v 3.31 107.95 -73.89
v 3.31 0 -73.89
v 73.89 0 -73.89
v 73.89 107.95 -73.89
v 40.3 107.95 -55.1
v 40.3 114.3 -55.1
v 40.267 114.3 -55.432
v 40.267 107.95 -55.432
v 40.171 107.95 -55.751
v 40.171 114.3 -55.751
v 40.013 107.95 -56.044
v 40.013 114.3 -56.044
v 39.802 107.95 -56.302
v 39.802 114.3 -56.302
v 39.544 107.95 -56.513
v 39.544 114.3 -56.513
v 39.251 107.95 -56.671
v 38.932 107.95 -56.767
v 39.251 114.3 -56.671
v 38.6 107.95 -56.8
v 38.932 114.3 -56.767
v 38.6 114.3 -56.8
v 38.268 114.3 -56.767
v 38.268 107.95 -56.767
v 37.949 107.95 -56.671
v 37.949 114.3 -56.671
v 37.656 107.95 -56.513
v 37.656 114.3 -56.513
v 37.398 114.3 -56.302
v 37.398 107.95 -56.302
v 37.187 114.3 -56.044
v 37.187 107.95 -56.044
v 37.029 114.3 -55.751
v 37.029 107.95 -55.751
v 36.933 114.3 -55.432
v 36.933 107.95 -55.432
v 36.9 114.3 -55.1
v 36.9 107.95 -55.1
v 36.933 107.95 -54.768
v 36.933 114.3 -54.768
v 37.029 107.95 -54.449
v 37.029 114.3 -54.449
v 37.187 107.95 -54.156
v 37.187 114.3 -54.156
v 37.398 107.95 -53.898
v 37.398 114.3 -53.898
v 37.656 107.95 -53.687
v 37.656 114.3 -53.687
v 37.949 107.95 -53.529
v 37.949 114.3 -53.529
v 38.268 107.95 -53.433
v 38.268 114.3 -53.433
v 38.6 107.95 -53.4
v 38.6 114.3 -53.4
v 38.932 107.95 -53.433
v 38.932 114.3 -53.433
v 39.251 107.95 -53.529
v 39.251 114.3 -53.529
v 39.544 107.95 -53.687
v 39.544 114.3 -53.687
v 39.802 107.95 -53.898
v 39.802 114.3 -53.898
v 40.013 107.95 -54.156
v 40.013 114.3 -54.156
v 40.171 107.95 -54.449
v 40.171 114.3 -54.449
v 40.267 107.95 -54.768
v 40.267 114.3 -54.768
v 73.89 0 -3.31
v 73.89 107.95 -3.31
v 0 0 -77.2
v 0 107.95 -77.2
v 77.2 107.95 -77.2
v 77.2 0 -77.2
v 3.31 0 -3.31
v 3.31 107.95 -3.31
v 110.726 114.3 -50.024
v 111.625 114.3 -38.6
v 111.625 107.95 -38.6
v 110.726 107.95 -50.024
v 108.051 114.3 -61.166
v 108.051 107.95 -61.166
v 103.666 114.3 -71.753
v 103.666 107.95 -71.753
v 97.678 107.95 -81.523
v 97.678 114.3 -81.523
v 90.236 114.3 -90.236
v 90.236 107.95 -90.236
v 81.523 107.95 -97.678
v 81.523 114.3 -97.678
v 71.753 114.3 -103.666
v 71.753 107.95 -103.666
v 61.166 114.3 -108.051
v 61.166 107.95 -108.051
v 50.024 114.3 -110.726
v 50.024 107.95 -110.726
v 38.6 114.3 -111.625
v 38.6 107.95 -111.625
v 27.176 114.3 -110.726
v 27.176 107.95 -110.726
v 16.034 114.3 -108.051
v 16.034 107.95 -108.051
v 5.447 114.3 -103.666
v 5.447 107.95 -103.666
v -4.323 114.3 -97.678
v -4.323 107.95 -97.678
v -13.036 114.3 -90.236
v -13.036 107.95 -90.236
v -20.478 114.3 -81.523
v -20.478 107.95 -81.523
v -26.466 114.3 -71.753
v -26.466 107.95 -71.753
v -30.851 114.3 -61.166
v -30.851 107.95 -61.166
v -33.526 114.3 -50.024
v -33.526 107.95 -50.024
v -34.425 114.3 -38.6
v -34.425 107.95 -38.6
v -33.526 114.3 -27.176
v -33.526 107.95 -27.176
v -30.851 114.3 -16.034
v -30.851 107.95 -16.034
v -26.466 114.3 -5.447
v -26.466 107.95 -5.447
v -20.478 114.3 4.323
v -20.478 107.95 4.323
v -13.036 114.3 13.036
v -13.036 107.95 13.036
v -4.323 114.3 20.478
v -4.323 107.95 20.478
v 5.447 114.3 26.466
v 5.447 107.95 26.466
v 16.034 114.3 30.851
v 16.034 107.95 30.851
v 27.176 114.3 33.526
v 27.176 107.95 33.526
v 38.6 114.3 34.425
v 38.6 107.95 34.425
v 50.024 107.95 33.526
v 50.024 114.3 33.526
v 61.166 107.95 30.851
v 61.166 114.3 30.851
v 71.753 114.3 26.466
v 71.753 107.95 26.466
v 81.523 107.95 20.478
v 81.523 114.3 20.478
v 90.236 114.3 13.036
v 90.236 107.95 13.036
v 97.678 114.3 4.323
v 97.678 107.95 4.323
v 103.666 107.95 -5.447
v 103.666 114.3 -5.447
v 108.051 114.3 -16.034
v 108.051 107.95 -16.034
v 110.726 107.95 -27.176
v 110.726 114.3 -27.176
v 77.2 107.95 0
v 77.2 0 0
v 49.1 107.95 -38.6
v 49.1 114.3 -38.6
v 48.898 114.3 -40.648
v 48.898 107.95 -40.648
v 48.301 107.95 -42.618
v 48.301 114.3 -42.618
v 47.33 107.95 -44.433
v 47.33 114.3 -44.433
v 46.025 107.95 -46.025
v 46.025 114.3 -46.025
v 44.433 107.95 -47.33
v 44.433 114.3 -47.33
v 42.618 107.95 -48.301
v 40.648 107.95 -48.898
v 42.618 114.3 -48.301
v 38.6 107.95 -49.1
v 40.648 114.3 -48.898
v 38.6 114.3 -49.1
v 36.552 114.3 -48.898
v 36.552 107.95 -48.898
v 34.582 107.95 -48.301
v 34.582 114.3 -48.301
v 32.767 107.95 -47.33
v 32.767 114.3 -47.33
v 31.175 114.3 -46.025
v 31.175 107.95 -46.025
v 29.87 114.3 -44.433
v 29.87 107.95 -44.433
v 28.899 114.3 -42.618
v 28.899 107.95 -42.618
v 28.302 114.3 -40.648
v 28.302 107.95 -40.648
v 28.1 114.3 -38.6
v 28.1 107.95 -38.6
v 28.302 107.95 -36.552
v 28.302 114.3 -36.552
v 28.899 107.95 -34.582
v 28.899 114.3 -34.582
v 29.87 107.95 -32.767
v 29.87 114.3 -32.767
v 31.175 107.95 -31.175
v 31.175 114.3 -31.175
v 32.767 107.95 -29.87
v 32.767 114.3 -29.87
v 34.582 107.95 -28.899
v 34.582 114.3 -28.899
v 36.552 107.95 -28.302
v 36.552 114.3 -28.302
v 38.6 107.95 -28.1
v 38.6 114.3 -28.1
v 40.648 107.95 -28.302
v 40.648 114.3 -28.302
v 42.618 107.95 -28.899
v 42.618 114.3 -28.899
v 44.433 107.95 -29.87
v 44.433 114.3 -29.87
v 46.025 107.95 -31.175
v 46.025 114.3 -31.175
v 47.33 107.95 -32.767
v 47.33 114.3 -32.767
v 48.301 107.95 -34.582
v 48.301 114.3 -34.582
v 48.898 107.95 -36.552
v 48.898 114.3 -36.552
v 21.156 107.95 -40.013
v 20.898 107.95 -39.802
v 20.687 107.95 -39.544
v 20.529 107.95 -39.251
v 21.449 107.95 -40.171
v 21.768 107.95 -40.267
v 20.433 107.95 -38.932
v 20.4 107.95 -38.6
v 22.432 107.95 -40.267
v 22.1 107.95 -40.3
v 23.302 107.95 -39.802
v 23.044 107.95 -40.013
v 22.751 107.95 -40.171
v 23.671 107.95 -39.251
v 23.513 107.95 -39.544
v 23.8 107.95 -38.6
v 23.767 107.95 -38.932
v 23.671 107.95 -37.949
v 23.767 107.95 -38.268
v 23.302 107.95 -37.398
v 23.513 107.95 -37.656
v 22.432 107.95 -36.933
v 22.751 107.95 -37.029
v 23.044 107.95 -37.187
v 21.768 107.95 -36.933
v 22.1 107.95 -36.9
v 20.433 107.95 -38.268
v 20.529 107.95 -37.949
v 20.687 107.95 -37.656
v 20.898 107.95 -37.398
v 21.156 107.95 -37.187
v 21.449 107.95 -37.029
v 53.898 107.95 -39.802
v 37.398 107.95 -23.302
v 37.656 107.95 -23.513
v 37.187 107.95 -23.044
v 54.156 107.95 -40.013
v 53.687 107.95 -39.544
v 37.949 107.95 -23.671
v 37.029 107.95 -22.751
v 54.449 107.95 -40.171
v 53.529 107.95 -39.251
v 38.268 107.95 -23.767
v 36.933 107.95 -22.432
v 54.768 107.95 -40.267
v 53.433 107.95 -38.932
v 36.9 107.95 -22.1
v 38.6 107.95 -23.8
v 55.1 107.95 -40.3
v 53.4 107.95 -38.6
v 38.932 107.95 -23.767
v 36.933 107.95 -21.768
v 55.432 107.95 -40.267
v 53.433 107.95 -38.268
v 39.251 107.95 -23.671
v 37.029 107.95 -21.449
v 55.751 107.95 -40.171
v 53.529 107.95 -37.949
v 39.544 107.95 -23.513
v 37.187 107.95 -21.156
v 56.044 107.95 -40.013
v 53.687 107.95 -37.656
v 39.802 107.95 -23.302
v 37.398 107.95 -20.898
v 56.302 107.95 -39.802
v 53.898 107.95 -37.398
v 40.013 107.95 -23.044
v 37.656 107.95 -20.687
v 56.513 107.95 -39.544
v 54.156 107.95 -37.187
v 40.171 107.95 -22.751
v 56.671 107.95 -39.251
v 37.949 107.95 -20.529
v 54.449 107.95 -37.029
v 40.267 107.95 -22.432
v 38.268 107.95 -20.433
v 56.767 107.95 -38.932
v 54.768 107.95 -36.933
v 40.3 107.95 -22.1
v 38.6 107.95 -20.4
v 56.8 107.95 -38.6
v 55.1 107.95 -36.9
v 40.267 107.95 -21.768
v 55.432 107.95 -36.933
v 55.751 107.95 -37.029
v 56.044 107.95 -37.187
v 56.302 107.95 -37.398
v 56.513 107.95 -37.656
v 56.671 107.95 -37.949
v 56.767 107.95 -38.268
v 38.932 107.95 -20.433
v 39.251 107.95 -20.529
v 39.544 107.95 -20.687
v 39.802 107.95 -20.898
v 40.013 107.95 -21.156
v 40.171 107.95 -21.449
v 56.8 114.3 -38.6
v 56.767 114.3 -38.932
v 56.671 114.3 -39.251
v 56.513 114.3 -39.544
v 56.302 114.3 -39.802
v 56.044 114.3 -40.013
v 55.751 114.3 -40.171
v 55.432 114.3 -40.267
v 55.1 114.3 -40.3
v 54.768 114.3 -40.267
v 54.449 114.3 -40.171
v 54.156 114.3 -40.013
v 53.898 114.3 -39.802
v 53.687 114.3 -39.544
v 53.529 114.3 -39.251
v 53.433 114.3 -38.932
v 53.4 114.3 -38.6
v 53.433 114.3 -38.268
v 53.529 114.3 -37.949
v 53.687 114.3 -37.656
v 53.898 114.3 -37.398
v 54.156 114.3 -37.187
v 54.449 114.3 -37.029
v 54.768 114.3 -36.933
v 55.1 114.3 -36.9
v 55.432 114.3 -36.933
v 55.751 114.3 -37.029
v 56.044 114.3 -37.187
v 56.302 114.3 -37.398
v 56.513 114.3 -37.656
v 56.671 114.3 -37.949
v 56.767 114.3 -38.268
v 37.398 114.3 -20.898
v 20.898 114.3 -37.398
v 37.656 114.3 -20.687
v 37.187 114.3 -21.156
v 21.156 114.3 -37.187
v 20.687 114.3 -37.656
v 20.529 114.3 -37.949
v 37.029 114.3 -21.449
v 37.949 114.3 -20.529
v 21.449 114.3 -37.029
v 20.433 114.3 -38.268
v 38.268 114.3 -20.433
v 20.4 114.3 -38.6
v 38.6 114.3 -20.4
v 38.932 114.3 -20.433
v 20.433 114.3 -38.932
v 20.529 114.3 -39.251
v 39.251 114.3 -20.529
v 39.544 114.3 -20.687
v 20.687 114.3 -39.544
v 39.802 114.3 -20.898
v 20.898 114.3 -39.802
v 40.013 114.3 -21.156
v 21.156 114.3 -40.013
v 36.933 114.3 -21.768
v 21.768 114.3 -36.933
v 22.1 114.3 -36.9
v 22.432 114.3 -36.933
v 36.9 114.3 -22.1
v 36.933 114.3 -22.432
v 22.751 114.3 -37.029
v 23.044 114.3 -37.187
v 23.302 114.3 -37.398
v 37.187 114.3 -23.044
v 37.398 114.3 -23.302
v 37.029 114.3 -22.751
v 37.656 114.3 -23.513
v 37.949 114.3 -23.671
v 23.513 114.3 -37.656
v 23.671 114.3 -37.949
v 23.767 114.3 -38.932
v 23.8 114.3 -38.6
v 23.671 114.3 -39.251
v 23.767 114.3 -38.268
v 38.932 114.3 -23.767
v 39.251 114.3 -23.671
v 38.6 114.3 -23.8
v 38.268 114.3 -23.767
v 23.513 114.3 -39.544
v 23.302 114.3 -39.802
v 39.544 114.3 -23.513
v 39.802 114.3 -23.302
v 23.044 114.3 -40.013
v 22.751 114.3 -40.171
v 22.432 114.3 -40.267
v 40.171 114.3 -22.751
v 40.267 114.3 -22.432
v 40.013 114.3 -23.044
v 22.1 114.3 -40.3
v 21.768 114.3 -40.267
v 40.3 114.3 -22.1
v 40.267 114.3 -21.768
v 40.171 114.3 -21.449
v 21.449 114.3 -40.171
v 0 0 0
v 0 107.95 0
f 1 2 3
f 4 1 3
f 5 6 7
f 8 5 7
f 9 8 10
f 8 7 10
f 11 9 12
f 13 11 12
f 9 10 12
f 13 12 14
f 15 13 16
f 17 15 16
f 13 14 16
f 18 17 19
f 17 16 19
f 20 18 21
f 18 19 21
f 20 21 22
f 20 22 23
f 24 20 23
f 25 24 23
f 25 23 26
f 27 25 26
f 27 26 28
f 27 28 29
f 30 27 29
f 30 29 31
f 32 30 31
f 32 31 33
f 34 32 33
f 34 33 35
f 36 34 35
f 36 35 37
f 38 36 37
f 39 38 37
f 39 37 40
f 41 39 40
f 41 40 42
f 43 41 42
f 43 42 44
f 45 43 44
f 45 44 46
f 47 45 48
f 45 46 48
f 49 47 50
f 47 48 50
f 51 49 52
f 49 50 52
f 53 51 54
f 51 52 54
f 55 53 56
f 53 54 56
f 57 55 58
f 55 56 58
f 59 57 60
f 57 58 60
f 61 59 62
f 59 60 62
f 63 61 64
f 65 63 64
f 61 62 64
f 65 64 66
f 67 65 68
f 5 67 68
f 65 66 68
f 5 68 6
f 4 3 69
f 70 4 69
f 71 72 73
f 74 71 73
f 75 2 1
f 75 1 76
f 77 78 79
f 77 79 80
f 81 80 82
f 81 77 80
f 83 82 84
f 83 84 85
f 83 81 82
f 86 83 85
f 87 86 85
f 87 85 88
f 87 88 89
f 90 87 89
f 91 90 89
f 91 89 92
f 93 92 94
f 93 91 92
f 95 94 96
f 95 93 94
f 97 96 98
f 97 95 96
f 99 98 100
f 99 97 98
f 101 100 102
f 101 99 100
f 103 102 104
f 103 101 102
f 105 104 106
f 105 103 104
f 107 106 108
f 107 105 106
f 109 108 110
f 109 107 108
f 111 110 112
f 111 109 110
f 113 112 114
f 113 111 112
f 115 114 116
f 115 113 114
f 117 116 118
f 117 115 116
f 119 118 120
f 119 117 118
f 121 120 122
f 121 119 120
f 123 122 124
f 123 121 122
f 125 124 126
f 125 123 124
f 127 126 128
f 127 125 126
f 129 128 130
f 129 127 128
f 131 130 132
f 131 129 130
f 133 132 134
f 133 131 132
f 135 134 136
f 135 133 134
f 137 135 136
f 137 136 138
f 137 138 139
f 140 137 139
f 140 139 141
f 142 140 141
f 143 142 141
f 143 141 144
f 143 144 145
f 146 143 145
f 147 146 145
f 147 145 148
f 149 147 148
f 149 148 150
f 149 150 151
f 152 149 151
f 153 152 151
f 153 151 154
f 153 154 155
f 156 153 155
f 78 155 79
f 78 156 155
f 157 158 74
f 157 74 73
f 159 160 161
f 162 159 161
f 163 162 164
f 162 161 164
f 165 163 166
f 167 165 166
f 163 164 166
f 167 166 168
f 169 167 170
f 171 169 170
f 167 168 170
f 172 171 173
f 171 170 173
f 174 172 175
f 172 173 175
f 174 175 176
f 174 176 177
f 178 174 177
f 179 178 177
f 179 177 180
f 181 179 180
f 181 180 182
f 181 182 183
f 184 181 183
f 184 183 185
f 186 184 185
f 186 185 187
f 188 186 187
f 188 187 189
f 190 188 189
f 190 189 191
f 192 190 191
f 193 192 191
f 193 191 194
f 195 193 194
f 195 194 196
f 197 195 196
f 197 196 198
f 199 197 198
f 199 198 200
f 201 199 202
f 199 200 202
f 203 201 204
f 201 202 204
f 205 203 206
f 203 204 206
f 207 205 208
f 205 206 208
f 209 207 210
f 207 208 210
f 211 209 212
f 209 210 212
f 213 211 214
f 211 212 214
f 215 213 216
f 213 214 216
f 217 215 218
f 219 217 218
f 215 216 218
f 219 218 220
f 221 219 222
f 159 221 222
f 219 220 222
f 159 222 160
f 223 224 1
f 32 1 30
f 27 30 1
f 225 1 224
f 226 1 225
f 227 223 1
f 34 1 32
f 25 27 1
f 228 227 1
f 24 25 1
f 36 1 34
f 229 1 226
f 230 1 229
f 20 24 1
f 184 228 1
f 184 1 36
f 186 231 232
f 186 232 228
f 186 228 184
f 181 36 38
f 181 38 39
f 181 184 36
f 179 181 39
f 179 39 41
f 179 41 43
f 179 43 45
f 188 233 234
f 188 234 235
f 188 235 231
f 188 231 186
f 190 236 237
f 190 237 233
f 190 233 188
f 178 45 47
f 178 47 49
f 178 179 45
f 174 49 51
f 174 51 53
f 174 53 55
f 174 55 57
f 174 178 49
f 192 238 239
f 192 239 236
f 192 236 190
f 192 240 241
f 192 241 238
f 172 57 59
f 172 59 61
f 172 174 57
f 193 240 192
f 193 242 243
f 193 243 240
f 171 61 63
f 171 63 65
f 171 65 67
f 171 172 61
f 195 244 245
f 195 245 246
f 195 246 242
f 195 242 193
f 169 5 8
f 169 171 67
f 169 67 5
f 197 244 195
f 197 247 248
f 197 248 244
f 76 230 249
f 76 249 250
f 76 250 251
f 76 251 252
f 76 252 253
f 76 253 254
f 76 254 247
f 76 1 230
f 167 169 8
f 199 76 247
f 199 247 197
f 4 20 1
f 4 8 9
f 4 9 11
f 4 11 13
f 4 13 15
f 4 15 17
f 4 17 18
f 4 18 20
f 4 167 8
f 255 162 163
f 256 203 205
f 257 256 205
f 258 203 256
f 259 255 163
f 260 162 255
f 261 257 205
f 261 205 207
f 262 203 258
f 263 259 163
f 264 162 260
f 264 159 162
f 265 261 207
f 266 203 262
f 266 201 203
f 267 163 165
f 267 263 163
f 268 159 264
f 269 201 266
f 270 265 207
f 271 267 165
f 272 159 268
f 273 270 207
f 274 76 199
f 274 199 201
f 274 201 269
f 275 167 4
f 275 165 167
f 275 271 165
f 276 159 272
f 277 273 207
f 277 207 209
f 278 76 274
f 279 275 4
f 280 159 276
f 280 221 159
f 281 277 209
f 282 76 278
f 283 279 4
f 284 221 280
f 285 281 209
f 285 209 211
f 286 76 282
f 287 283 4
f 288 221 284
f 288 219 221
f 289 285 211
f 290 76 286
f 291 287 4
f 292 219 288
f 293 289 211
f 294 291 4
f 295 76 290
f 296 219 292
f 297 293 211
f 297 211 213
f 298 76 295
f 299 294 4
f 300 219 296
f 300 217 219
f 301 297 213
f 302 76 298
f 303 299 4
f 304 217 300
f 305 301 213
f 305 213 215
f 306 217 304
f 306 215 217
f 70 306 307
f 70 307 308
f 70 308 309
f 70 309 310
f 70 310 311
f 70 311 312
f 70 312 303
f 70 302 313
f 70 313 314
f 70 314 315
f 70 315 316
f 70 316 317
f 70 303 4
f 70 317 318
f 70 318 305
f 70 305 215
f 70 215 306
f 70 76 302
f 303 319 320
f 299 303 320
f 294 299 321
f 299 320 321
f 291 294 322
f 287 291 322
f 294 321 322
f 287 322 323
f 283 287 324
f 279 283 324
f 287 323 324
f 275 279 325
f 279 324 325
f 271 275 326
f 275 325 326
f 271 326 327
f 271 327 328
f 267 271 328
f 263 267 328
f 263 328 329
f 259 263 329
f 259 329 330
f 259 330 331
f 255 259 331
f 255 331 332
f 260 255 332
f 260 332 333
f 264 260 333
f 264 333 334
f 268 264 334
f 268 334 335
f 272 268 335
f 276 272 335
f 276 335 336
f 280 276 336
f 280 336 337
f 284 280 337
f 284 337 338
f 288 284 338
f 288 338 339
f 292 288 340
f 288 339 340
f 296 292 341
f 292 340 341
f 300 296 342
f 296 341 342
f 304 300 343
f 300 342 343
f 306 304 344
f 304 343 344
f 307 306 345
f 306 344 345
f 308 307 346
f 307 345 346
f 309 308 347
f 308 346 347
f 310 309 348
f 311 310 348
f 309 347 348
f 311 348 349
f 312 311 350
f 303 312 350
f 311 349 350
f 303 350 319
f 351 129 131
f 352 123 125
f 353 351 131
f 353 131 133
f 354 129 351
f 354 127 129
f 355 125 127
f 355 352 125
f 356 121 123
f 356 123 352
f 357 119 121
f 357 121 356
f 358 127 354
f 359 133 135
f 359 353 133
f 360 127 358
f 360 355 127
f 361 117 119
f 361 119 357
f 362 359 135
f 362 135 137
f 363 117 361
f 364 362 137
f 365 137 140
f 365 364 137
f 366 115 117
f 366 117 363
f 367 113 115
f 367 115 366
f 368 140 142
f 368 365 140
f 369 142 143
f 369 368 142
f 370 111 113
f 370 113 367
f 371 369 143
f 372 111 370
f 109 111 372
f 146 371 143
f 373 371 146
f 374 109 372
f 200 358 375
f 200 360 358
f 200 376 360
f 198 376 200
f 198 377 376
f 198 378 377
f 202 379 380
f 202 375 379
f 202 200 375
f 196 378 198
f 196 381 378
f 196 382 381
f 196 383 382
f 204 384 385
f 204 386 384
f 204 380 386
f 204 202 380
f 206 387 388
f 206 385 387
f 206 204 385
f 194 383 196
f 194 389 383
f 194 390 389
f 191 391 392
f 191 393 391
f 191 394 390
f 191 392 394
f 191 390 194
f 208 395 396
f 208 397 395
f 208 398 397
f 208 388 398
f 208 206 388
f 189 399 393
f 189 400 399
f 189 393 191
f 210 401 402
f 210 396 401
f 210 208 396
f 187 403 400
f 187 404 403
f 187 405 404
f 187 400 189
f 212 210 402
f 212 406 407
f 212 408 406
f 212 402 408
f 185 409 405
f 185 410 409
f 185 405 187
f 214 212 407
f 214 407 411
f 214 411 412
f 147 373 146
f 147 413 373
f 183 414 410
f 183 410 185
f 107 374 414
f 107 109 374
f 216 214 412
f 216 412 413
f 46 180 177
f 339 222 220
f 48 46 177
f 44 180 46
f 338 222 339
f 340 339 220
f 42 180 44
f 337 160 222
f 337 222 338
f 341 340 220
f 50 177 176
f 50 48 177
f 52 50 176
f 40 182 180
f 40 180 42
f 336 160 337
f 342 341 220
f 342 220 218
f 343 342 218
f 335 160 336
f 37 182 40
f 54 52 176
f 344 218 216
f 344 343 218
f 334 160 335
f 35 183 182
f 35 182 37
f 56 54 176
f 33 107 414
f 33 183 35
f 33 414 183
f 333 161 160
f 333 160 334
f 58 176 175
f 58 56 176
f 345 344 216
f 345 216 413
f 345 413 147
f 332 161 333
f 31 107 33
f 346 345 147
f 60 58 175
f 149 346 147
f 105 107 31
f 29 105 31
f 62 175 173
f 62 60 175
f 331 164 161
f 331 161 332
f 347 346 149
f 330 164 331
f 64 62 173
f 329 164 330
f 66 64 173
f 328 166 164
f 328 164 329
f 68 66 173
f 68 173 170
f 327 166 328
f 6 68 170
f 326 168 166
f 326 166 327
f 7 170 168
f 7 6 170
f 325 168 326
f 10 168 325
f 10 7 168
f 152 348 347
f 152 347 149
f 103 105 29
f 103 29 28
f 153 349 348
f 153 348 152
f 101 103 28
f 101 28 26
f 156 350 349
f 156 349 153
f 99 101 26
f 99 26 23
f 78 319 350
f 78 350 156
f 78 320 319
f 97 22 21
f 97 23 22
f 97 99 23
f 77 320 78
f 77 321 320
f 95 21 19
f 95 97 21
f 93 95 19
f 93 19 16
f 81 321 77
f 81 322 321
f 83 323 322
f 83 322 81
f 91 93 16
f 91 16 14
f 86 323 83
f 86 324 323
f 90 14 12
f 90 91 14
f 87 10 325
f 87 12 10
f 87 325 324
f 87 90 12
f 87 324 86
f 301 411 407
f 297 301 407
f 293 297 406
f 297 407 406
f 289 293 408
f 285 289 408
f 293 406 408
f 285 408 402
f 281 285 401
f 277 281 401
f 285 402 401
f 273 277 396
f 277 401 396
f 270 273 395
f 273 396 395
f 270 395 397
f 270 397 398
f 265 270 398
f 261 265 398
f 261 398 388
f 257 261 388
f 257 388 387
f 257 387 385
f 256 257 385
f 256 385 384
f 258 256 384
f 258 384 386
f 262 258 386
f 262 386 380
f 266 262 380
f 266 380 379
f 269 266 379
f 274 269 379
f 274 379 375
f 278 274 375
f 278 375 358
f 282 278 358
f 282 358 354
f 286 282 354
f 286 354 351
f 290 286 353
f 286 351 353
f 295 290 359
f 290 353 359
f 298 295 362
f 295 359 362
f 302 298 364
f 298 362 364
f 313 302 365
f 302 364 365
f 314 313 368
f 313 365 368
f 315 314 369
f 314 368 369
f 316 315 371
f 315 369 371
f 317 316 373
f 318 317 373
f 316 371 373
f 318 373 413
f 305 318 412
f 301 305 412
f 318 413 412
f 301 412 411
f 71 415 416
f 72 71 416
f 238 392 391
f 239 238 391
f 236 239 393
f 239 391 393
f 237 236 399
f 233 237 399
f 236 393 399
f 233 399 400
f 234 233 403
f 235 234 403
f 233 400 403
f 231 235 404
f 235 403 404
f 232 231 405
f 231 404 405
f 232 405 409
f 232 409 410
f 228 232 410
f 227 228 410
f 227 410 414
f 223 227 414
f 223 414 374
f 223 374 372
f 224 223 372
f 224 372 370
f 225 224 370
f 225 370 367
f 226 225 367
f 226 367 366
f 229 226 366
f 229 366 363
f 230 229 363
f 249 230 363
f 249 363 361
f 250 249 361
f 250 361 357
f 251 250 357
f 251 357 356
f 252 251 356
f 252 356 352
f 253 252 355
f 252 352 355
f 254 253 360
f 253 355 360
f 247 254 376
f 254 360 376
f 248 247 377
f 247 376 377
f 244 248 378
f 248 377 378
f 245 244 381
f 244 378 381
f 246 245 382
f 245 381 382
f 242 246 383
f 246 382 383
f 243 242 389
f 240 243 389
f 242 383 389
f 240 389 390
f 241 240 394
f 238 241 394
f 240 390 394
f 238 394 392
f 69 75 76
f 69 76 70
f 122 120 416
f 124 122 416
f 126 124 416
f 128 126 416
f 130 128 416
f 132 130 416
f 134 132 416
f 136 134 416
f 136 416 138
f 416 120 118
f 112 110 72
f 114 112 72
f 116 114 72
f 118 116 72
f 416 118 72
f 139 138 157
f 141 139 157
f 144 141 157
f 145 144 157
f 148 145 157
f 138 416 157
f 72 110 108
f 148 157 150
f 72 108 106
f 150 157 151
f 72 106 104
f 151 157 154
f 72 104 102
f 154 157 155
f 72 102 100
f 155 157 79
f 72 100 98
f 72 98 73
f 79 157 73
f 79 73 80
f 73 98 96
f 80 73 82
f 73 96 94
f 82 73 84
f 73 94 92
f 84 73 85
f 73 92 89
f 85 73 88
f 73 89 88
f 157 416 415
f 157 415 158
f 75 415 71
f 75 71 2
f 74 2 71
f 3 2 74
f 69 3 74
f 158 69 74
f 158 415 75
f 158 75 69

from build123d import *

# Parameters (mm, degrees)
SKETCH1_W           = 77.2
SKETCH1_H           = 114.3
BOSS_EXTRUDE1_DEPTH = 77.2
SKETCH2_W           = 70.58
SKETCH2_H           = 70.58
CUT_EXTRUDE1_DEPTH  = 107.95
SKETCH3_R           = 10.5
SKETCH3_R_2         = 1.7
CUT_EXTRUDE2_DEPTH  = 115.3
SKETCH4_R           = 73.025
SKETCH4_R_2         = 1.7
SKETCH4_R_3         = 10.5
BOSS_EXTRUDE4_DEPTH = 6.35


with BuildPart() as part:
    # Sketch1 → Boss-Extrude1 (new body)
    with BuildSketch(Plane.XY):
        with Locations((38.6, 57.15)):
            Rectangle(SKETCH1_W, SKETCH1_H)
    extrude(amount=-BOSS_EXTRUDE1_DEPTH)

    # Sketch2 → Cut-Extrude1 (cut)
    with BuildSketch(Plane.XZ):
        with Locations((38.6, -38.6)):
            Rectangle(SKETCH2_W, SKETCH2_H)
    extrude(amount=-CUT_EXTRUDE1_DEPTH, mode=Mode.SUBTRACT)

    # Sketch3 → Cut-Extrude2 (cut, through all)
    with BuildSketch(Plane(origin=(0, 114.3, 0), x_dir=(1, 0, 0), z_dir=(0, 1, 0))):
        with Locations((38.6, 38.6)):
            Circle(SKETCH3_R)
        with Locations((38.6, 55.1)):
            Circle(SKETCH3_R_2)
        with Locations((55.1, 38.6)):
            Circle(SKETCH3_R_2)
        with Locations((38.6, 22.1)):
            Circle(SKETCH3_R_2)
        with Locations((22.1, 38.6)):
            Circle(SKETCH3_R_2)
    extrude(amount=-CUT_EXTRUDE2_DEPTH, mode=Mode.SUBTRACT)

    # Sketch4 → Boss-Extrude4 (add)
    with BuildSketch(Plane(origin=(0, 114.3, 0), x_dir=(1, 0, 0), z_dir=(0, 1, 0))):
        with Locations((38.6, 38.6)):
            Circle(SKETCH4_R)
        with Locations((38.6, 55.1)):
            Circle(SKETCH4_R_2, mode=Mode.SUBTRACT)
        with Locations((55.1, 38.6)):
            Circle(SKETCH4_R_2, mode=Mode.SUBTRACT)
        with Locations((38.6, 22.1)):
            Circle(SKETCH4_R_2, mode=Mode.SUBTRACT)
        with Locations((22.1, 38.6)):
            Circle(SKETCH4_R_2, mode=Mode.SUBTRACT)
        with Locations((38.6, 38.6)):
            Circle(SKETCH4_R_3, mode=Mode.SUBTRACT)
    extrude(amount=-BOSS_EXTRUDE4_DEPTH)


solid = part.part
